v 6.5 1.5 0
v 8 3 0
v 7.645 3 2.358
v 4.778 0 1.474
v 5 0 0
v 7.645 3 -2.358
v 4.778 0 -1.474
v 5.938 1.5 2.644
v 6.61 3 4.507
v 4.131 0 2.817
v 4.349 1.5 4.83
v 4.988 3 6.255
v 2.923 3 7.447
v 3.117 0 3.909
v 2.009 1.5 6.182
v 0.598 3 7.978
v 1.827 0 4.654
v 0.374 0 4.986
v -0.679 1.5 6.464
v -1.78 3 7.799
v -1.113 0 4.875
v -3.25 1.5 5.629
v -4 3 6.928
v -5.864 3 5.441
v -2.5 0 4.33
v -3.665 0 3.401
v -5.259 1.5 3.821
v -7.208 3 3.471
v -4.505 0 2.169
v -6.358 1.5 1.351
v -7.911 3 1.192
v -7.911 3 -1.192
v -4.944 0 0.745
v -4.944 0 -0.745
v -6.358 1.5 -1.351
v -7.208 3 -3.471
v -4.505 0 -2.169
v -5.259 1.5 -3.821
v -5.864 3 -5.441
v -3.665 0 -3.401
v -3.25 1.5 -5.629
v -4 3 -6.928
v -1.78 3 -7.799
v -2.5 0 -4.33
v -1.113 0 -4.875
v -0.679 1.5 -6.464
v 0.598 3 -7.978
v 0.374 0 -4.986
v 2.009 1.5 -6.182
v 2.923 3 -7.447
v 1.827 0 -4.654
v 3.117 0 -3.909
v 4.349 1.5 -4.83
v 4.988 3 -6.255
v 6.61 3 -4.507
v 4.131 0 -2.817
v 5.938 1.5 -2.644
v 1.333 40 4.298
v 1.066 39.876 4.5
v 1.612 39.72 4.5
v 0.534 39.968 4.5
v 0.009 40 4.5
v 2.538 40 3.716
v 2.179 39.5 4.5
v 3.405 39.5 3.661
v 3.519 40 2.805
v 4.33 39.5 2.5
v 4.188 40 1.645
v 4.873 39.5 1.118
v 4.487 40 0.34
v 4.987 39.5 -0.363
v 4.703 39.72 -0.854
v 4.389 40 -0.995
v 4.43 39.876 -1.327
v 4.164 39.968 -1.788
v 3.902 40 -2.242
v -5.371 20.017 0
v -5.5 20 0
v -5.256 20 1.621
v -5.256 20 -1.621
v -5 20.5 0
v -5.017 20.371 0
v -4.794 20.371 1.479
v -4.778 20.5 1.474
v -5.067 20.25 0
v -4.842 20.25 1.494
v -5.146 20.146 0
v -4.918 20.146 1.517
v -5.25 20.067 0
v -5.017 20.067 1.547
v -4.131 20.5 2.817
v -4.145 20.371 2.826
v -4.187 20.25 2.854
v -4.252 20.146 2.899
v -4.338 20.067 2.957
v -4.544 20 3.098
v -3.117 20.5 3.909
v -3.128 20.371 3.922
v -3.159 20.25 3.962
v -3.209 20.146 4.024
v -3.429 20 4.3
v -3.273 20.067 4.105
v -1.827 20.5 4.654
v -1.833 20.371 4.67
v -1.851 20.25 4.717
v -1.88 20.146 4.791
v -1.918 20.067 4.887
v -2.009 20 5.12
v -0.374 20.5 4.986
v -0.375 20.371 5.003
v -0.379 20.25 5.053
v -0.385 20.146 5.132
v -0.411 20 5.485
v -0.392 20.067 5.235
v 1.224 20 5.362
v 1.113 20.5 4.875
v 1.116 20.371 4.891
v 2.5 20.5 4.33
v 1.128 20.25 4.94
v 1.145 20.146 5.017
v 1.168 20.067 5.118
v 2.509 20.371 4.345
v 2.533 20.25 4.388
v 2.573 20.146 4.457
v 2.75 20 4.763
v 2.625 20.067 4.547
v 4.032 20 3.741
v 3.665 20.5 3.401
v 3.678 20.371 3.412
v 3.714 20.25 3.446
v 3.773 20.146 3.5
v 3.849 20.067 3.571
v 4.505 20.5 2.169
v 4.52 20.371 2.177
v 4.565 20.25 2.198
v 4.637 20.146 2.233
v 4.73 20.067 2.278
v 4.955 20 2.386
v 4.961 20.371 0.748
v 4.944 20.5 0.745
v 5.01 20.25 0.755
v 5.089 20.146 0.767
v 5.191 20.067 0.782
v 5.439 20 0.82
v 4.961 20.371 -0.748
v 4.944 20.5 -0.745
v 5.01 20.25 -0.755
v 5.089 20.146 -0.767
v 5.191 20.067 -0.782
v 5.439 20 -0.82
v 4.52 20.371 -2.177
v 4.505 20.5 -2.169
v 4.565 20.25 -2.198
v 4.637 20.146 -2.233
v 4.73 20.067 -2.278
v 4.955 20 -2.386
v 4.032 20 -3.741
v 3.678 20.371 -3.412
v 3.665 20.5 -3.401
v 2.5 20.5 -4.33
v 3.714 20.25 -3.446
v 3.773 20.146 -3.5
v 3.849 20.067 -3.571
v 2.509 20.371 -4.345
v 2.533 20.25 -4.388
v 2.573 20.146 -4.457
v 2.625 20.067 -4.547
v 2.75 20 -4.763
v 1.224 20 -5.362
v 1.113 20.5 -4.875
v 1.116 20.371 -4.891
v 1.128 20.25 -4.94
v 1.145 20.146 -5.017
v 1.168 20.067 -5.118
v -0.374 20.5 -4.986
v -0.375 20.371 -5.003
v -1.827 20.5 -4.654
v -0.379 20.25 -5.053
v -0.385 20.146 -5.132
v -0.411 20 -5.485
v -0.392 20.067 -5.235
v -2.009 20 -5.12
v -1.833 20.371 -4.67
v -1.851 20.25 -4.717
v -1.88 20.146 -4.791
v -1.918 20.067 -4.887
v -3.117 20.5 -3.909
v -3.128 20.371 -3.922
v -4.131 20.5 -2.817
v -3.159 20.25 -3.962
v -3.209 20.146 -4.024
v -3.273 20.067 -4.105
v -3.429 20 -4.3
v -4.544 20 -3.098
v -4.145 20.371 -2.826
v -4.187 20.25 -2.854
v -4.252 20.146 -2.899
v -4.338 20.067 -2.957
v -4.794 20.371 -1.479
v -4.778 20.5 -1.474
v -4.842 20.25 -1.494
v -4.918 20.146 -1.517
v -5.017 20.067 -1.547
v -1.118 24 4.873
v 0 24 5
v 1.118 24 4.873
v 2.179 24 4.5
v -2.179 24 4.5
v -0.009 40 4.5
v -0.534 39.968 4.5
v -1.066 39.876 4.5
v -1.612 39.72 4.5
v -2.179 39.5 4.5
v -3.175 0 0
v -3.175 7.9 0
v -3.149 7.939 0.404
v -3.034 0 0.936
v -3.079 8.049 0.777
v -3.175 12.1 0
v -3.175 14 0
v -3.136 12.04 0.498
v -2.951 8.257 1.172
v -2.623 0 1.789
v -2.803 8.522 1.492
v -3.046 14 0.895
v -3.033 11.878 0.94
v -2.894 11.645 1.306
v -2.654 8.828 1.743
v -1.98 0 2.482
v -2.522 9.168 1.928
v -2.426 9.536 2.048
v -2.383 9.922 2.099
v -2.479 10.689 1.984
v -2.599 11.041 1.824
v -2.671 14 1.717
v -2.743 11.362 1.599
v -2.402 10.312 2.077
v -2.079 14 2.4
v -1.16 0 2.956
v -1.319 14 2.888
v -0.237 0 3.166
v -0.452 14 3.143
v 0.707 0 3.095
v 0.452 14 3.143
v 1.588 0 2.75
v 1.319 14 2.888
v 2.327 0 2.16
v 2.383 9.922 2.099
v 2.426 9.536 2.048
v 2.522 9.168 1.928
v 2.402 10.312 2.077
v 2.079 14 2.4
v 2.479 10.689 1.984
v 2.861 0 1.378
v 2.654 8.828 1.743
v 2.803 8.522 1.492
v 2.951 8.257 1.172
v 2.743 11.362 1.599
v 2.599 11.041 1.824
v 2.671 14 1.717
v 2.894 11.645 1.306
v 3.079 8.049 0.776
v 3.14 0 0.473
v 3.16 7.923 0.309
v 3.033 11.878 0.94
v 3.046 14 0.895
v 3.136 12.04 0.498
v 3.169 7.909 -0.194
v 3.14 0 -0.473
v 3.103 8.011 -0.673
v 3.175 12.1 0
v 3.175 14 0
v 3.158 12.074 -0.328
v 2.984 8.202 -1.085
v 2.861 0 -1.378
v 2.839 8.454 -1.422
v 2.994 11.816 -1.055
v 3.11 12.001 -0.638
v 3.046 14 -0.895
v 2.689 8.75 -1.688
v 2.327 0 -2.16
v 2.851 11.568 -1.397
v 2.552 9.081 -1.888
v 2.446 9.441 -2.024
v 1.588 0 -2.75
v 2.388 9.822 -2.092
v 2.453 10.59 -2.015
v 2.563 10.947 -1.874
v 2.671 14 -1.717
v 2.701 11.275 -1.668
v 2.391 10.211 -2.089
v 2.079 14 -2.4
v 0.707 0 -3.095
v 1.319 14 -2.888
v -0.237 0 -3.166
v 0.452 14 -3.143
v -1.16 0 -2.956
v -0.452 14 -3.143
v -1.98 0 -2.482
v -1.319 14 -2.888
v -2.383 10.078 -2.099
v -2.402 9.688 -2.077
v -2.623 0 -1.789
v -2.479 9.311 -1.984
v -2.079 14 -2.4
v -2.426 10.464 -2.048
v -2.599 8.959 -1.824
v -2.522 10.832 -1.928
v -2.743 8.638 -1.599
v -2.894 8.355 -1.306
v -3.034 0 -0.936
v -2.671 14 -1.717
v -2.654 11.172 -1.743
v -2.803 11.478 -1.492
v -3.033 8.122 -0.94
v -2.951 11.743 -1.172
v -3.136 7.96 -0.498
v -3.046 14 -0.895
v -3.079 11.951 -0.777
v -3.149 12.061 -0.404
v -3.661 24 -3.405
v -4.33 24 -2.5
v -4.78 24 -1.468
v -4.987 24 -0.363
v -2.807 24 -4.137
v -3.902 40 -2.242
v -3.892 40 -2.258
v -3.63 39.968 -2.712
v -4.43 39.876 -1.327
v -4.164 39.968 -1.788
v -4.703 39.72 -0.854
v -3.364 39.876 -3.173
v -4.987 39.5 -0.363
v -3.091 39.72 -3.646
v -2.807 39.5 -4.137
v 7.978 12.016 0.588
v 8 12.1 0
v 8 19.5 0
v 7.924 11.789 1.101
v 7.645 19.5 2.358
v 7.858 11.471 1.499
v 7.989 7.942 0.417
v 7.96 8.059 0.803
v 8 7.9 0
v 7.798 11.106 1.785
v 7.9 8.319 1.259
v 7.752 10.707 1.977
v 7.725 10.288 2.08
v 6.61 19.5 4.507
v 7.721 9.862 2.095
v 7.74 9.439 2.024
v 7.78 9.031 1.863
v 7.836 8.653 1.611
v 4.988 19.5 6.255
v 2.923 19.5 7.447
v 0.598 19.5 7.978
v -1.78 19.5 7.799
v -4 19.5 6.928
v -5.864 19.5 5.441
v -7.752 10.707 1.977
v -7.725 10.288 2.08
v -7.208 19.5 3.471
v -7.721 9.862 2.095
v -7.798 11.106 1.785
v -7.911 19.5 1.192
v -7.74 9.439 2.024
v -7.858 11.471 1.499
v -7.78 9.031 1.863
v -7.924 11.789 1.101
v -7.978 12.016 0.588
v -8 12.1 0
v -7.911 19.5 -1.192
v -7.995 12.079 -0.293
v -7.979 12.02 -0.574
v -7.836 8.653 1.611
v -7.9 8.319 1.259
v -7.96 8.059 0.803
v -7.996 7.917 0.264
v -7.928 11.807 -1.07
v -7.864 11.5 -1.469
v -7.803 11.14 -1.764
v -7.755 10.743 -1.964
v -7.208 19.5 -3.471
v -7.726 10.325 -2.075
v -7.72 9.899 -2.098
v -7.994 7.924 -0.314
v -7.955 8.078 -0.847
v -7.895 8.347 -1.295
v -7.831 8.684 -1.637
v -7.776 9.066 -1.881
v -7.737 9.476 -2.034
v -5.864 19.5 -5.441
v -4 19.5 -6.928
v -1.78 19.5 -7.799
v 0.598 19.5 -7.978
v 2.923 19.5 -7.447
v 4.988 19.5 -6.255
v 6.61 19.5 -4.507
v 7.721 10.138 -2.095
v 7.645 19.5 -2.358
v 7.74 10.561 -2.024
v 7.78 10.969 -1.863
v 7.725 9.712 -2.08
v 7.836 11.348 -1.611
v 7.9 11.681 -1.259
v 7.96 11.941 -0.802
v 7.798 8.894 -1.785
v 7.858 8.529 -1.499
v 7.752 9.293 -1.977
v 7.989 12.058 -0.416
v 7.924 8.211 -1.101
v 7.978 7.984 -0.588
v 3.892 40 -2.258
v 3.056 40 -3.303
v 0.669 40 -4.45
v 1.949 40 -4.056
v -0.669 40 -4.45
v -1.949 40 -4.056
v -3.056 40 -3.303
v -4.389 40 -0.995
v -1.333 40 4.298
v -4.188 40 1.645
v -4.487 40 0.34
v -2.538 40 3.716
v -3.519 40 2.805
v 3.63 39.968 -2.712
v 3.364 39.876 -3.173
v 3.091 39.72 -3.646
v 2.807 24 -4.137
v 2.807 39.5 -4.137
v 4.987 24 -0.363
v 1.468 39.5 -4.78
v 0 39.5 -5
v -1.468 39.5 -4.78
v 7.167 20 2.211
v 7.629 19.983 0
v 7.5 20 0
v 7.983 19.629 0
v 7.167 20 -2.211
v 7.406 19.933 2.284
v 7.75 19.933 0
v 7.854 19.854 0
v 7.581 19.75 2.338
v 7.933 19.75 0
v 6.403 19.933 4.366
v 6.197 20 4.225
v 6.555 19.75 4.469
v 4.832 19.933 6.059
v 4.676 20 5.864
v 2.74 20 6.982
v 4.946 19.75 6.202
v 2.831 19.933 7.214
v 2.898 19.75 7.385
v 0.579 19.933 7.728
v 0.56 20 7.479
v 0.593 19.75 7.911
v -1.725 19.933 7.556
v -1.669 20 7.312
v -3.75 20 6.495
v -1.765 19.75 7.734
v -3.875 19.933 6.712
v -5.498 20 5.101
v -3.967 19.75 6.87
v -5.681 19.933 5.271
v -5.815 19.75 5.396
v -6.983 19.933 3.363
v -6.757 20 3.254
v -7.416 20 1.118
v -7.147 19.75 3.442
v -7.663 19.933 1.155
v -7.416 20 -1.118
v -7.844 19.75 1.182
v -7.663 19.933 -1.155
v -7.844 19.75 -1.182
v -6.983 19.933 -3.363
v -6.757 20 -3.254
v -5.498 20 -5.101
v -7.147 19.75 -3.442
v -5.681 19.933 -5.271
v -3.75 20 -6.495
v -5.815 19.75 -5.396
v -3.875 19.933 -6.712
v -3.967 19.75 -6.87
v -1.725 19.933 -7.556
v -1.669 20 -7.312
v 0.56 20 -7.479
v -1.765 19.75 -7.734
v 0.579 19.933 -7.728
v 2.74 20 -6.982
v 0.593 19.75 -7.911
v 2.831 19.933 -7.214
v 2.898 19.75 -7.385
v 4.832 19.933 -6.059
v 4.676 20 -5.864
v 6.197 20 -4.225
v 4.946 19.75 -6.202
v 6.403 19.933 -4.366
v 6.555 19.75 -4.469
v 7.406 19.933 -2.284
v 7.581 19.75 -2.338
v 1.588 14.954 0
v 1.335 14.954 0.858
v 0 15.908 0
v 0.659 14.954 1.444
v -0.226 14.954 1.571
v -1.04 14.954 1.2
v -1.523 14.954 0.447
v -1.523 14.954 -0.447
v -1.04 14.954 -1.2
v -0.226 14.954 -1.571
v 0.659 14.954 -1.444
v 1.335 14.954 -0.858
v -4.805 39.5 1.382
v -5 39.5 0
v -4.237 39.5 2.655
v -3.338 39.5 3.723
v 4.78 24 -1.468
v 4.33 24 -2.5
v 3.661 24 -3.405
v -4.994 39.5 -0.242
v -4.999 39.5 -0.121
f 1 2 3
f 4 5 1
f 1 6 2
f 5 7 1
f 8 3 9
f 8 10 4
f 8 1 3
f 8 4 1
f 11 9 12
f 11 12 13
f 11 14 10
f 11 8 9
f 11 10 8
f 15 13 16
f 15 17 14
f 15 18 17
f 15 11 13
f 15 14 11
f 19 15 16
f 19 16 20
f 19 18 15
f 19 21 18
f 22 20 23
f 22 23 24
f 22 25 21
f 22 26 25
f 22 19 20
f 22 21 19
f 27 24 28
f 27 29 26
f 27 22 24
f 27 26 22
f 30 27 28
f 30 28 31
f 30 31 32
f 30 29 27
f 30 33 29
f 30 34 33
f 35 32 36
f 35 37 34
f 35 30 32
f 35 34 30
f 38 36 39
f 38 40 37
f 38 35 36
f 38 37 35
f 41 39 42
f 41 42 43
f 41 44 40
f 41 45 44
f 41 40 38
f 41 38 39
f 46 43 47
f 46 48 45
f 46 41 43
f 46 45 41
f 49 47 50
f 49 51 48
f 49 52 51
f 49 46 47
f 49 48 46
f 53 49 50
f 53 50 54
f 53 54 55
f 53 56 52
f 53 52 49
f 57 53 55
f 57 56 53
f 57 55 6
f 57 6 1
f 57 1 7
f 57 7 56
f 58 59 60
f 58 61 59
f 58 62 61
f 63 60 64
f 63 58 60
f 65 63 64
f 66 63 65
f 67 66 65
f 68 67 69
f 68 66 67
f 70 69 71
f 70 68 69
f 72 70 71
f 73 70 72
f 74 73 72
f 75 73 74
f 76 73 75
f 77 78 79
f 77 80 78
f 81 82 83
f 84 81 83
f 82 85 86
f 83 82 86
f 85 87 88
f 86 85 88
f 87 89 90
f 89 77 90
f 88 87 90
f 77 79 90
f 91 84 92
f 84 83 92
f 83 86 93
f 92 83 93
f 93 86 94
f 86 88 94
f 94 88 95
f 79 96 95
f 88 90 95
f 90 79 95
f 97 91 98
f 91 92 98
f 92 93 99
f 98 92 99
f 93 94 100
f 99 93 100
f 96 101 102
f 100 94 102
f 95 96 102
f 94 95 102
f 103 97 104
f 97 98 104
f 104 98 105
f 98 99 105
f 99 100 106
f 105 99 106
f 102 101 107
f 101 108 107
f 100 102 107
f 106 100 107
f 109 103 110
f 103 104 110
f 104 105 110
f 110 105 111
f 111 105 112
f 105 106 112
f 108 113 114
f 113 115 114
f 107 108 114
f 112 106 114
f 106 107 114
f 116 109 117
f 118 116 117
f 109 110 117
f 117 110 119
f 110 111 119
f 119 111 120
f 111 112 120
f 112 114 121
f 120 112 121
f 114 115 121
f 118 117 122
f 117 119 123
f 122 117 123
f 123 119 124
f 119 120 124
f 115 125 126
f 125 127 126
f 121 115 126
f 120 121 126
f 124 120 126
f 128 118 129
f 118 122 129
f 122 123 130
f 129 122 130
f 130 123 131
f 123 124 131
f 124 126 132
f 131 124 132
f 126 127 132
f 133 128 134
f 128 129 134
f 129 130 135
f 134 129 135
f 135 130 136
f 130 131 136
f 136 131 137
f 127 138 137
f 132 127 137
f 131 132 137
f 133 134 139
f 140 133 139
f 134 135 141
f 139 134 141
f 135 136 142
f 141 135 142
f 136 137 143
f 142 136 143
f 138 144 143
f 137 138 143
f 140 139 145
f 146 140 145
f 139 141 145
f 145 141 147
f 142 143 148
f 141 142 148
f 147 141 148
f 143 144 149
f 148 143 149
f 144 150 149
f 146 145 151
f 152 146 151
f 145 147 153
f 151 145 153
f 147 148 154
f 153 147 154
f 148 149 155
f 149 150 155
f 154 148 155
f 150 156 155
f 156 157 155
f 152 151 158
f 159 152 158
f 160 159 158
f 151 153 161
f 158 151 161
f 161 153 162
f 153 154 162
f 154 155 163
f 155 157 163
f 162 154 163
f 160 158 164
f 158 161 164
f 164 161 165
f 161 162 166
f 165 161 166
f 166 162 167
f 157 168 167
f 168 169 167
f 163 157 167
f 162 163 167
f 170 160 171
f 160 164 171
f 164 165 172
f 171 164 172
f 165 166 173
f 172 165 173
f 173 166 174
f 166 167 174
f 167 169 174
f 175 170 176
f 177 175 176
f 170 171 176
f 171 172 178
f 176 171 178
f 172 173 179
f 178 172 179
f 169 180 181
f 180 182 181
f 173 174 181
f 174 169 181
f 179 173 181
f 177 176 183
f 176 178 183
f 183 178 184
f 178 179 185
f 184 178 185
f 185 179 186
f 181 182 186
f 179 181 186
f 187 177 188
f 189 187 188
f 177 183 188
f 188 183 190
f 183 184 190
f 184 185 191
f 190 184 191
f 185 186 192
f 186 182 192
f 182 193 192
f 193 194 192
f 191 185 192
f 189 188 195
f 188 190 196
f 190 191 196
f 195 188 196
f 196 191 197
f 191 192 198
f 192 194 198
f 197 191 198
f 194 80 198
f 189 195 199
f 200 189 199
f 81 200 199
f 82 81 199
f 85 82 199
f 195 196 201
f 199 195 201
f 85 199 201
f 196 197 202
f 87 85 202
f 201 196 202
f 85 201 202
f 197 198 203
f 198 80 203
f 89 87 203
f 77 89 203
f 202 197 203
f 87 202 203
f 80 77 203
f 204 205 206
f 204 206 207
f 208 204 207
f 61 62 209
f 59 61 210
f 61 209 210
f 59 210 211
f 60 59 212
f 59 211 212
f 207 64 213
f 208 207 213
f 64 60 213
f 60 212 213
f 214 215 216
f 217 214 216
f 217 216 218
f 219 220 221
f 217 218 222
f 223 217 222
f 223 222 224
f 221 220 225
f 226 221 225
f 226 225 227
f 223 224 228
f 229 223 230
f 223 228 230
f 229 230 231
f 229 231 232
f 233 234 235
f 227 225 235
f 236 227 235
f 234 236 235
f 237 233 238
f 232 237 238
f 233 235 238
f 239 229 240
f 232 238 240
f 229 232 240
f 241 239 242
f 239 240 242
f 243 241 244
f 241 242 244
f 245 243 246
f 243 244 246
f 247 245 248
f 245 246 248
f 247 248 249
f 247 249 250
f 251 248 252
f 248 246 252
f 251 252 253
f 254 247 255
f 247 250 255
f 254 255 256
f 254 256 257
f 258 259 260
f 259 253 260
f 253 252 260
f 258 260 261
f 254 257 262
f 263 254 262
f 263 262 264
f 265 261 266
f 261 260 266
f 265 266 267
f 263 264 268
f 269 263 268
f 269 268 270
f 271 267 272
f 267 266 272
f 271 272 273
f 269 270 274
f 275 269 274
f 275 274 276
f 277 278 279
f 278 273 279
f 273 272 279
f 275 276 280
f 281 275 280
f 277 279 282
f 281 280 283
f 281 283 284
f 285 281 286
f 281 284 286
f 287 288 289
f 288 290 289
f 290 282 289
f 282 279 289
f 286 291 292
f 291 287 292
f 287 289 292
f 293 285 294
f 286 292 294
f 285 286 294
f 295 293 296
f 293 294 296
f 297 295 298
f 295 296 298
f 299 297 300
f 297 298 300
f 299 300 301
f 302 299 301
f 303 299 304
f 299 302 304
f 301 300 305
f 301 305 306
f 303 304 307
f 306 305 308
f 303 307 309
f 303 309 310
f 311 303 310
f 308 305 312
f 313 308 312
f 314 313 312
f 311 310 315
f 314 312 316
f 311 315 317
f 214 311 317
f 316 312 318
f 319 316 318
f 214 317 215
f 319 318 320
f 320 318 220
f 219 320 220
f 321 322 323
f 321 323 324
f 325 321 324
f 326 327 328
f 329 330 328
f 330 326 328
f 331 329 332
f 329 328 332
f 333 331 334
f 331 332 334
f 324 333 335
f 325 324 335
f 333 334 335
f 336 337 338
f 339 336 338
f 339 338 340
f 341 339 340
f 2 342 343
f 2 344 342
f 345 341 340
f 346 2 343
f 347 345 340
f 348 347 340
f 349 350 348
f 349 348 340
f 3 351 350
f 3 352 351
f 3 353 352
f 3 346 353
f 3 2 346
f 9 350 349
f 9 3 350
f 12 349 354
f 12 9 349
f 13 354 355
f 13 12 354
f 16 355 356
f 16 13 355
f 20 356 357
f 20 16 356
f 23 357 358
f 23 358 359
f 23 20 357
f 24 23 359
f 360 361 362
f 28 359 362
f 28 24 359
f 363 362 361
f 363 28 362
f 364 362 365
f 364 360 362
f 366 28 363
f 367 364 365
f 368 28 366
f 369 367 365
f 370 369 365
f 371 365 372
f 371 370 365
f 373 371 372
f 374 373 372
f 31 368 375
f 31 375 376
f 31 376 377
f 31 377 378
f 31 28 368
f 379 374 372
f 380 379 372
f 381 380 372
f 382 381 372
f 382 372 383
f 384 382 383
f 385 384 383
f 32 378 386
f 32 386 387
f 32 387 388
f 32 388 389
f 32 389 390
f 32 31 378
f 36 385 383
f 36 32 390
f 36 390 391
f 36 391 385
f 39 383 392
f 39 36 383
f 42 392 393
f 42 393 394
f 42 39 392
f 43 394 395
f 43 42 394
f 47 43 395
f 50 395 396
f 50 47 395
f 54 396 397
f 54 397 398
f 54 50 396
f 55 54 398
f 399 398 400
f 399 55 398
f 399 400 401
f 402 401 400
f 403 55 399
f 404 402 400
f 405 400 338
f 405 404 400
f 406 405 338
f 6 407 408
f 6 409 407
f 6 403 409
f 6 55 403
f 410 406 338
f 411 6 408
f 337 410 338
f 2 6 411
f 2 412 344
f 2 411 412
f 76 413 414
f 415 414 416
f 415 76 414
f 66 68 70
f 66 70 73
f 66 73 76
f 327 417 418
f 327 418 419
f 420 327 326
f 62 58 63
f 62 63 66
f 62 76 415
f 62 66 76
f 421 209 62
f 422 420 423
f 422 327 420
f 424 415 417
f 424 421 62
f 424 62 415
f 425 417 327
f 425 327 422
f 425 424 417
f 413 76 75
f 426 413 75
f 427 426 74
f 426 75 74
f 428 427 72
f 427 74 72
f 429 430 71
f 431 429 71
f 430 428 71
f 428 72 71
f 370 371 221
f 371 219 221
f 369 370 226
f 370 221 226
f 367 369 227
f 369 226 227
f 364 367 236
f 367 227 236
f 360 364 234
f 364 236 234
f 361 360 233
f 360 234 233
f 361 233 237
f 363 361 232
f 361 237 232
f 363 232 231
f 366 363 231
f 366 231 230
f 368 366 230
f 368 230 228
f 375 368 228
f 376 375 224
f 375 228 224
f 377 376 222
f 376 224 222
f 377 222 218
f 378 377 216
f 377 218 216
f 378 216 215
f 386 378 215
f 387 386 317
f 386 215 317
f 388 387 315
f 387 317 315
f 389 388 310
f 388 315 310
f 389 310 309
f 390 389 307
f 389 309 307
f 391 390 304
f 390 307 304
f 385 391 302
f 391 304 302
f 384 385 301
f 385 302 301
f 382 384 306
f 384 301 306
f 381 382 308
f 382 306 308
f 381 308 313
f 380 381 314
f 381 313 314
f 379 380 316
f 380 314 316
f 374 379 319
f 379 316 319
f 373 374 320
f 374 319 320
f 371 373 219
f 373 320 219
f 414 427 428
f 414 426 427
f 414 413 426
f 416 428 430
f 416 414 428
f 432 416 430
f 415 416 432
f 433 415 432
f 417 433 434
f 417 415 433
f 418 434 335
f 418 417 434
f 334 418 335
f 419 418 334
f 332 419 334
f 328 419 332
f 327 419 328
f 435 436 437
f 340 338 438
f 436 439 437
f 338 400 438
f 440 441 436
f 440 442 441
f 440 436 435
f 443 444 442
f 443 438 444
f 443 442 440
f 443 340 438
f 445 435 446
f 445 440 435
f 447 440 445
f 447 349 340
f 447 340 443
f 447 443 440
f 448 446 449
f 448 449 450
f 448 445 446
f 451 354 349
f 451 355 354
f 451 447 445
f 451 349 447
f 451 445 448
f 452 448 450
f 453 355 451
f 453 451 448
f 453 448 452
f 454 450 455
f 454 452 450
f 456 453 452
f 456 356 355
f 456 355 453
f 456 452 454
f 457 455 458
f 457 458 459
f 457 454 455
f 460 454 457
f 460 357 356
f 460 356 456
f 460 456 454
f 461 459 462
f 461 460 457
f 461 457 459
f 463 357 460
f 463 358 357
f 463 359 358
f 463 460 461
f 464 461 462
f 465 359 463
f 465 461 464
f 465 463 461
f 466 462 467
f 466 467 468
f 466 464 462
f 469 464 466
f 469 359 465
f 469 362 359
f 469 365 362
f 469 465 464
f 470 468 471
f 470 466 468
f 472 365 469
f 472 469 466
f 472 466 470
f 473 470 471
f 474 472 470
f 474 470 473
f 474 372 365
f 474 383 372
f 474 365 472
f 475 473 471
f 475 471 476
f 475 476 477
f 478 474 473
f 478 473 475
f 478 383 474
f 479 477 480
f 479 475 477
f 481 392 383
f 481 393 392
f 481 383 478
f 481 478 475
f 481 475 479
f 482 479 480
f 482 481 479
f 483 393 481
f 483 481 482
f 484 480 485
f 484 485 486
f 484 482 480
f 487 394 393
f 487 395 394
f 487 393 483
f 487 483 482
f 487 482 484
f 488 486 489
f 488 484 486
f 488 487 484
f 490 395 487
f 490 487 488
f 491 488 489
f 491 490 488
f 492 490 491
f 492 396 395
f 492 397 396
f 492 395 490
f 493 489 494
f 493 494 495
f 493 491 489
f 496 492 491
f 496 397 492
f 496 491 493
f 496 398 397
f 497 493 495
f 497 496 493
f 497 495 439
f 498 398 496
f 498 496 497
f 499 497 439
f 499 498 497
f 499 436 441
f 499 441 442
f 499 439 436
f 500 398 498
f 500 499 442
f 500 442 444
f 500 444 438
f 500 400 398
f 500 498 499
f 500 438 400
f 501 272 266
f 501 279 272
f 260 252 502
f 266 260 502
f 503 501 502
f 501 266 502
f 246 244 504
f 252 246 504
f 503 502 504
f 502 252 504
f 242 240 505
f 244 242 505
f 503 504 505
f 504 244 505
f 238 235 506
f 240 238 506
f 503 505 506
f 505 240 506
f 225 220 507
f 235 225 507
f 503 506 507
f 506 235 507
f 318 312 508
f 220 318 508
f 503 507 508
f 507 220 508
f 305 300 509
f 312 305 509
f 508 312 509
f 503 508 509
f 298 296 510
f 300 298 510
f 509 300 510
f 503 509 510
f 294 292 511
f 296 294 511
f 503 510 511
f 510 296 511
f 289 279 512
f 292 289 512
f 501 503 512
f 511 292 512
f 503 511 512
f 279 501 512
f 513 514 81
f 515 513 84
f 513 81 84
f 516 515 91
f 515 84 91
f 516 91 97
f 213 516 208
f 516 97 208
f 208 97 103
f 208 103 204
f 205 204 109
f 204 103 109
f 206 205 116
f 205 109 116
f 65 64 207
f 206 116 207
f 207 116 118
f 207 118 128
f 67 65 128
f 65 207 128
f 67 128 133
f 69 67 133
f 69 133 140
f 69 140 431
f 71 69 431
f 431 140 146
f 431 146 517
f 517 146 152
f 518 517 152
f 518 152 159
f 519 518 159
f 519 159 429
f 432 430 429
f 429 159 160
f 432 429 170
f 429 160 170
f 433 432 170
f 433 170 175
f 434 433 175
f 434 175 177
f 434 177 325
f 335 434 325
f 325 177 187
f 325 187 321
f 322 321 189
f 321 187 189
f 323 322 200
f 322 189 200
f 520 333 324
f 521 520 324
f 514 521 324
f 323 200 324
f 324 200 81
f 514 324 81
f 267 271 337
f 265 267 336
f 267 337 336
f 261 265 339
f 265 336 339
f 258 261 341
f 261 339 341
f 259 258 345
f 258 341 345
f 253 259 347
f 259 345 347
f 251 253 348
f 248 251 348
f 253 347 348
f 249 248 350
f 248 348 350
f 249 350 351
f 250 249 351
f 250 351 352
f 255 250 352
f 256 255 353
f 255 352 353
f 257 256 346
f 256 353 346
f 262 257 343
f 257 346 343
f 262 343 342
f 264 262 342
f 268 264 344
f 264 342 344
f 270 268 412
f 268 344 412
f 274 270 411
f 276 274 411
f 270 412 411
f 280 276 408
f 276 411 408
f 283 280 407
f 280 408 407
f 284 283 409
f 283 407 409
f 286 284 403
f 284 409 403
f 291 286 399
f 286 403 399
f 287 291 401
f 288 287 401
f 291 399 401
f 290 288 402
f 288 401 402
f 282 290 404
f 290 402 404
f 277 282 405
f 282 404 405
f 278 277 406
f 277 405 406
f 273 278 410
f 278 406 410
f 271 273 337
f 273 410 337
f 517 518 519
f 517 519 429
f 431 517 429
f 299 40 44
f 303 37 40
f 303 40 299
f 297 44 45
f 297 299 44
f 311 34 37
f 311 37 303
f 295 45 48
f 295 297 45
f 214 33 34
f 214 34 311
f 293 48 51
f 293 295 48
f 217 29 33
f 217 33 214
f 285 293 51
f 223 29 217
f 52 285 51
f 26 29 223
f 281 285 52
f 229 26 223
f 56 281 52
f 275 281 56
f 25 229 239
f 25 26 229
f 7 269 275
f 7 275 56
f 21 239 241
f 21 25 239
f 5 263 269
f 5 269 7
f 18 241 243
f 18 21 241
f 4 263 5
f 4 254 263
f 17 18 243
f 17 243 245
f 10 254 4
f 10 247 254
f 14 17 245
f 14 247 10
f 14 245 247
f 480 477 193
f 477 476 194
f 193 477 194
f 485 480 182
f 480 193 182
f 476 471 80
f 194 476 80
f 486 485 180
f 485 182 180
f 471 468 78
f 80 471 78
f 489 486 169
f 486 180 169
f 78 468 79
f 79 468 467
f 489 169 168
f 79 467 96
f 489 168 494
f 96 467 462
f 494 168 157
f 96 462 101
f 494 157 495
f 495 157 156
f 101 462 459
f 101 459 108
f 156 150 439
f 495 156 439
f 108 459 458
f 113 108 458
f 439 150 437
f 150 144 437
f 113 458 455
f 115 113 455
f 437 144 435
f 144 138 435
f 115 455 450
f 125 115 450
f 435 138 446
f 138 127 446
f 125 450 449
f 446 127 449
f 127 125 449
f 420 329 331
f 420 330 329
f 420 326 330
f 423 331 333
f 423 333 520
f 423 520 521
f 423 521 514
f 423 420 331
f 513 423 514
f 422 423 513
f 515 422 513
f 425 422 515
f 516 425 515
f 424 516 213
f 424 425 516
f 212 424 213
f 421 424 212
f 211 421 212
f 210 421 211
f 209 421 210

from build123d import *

# Parameters (mm, degrees)
F0_R            = 8
F1_DEPTH        = 20
F2_R            = 5
F3_DEPTH        = 20
F5_DEPTH        = 16
F5_COPIES_COUNT = 3
F6_SIZE         = 0.49999
F7_R            = 0.5
F9_D            = 6.35
F9_DEPTH        = 14
F9_TIP          = 1.9077324654
F10_R           = 2.1
F11_DEPTH       = 8.25
F12_SIZE        = 3


# Not quite as in the source:
# - a fillet or chamfer is up to 0.001 mm smaller than in the source, because OpenCascade refuses the exact size
# - a pattern or mirror of a feature is missing from the dataset's text; its kind, count and spacing are read off the source's solid


with BuildPart() as f1:
    # F0 (on Front) → F1 (new body)
    with BuildSketch(Plane.XZ):
        Circle(F0_R)
    extrude(amount=-F1_DEPTH)

    # F2 (on face) → F3 (join)
    with BuildSketch(Plane(origin=(0, 20, 0), x_dir=(-1, 0, 0), z_dir=(0, 1, 0))):
        Circle(F2_R)
    extrude(amount=F3_DEPTH)

    # F4 (on face) → F5 (cut)
    with BuildSketch(Plane(origin=(0, 40, 0), x_dir=(-1, 0, 0), z_dir=(0, 1, 0))):
        with BuildLine():
            ThreePointArc((2.1794494718, 4.5), (0, 5), (-2.1794494718, 4.5))
            Line((-2.1794494718, 4.5), (2.1794494718, 4.5))
        make_face()
    f5 = extrude(amount=-F5_DEPTH, mode=Mode.SUBTRACT)

    # F5_copies: F5 ×3 about axis
    f5_copies_axis = Axis((0, 0, 0), (0, 1, 0))
    for i in range(1, F5_COPIES_COUNT):
        add(f5.rotate(f5_copies_axis, i * 360 / F5_COPIES_COUNT), mode=Mode.SUBTRACT)

    # F6 (size 0.5 in the source; OpenCascade refuses exactly that, so slightly less here)
    f6_edges = [f1.edges().sort_by_distance(p)[0] for p in [
        (4.330127, 40, 2.5),
        (-4.996709, 40, -0.18139),
        (0, 40, -5),
        (-4.236582, 40, 2.655443),
    ]]
    chamfer(f6_edges, length=F6_SIZE)

    # F7
    f7_edges = [f1.edges().sort_by_distance(p)[0] for p in [
        (-8, 20, 0),
        (5, 20, 0),
    ]]
    fillet(f7_edges, radius=F7_R)

    # F9
    with Locations(Plane.XZ):
        with Locations((0, 0)):
            Hole(F9_D / 2, depth=F9_DEPTH)
            with Locations((0, 0, -(F9_DEPTH + F9_TIP / 2))):  # 118° drill point
                Cone(0, F9_D / 2, F9_TIP, mode=Mode.SUBTRACT)

    # F10 (on Right) → F11 (cut, symmetric)
    with BuildSketch(Plane.YZ):
        with Locations((10, 0)):
            Circle(F10_R)
    extrude(amount=F11_DEPTH, both=True, mode=Mode.SUBTRACT)

    # F12
    f12_edges = [f1.edges().sort_by_distance(p)[0] for p in [
        (-8, 0, 0),
    ]]
    chamfer(f12_edges, length=F12_SIZE)


solid = f1.part
